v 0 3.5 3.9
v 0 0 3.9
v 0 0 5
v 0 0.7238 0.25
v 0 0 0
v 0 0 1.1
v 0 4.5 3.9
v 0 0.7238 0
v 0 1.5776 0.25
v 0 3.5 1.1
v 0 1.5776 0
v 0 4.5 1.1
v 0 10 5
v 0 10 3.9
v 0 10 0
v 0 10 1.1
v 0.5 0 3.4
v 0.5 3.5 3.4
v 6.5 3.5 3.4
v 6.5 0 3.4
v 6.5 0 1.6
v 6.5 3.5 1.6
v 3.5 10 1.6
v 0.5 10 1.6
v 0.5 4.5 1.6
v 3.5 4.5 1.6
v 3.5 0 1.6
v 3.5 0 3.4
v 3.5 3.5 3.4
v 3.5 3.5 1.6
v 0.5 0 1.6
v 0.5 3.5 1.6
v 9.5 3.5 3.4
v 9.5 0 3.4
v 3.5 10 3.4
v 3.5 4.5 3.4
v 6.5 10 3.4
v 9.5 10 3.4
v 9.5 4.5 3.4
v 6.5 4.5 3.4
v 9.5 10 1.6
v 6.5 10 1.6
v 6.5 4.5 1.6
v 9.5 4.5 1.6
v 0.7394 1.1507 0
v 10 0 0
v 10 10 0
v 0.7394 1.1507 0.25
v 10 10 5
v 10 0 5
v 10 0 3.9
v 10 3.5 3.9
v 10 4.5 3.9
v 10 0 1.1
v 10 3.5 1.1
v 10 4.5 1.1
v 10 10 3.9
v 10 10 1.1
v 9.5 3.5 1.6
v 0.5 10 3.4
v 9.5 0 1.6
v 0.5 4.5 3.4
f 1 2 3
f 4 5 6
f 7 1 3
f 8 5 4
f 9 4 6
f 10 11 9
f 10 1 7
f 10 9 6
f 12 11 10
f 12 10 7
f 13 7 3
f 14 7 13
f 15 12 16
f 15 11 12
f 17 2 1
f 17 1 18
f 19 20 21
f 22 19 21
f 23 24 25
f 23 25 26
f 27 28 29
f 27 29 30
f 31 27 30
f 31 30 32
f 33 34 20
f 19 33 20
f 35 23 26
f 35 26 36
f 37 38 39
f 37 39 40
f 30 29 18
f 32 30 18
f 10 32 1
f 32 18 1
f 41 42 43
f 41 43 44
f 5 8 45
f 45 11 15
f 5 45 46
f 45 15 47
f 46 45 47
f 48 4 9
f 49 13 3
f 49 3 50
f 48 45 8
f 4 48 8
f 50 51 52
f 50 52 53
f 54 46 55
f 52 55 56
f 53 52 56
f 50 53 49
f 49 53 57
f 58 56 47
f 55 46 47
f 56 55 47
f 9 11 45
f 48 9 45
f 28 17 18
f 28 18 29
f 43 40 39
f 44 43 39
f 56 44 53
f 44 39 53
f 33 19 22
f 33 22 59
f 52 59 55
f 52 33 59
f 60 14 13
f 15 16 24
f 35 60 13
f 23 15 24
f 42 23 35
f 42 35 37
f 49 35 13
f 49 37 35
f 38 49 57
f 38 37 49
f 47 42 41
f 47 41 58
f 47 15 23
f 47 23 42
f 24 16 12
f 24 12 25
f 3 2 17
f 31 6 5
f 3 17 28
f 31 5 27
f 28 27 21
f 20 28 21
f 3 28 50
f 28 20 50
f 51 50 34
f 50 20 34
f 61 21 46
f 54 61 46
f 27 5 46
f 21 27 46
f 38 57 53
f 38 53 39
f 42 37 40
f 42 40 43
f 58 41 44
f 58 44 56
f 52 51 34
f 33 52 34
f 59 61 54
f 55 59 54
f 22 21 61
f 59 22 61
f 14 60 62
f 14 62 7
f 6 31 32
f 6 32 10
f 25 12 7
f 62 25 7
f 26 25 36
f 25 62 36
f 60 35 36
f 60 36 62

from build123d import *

# Parameters (mm, degrees)
SKETCH_W        = 10
SKETCH_H        = 10
PAD_DEPTH       = 5
POCKET_DEPTH    = 3.5
POCKET001_DEPTH = 5.5
POCKET002_DEPTH = 0.25


with BuildPart() as part:
    # Sketch → Pad (new body)
    with BuildSketch(Plane.XY):
        with Locations((5, 5)):
            Rectangle(SKETCH_W, SKETCH_H)
    extrude(amount=PAD_DEPTH)

    # Sketch001 (on Face1 of Pad) → Pocket (cut)
    with BuildSketch(Plane.XZ):
        Polygon((0, 3.9), (0.5, 3.4), (3.5, 3.4), (3.5, 1.6), (0.5, 1.6), (0, 1.1), (-0.843027, 1.1), (-0.843027, 3.9), align=None)
        Polygon((10.955688, 3.9), (10, 3.9), (9.5, 3.4), (6.5, 3.4), (6.5, 1.6), (9.5, 1.6), (10, 1.1), (10.955688, 1.1), align=None)
    extrude(amount=-POCKET_DEPTH, mode=Mode.SUBTRACT)

    # Sketch002 (on Face16 of Pocket) → Pocket001 (cut)
    with BuildSketch(Plane(origin=(0, 10, 0), x_dir=(-1, 0, 0), z_dir=(0, 1, 0))):
        Polygon((-11.13075, 3.9), (-10, 3.9), (-9.5, 3.4), (-6.5, 3.4), (-6.5, 1.6), (-9.5, 1.6), (-10, 1.1), (-11.181449, 1.1), (-11.181449, 3.860271), align=None)
        Polygon((-3.5, 3.4), (-0.5, 3.4), (0, 3.9), (0.82411, 3.9), (0.98968, 1.1), (0, 1.1), (-0.5, 1.6), (-3.5, 1.6), align=None)
    extrude(amount=-POCKET001_DEPTH, mode=Mode.SUBTRACT)

    # Sketch003 (on Face2 of Pocket001) → Pocket002 (cut)
    with BuildSketch(Plane(origin=(0, 0, 0), x_dir=(1, 0, 0), z_dir=(0, 0, -1))):
        Polygon((-0.717832, -0.309342), (-0.717832, -1.992022), (0.739412, -1.150682), align=None)
    extrude(amount=-POCKET002_DEPTH, mode=Mode.SUBTRACT)


solid = part.part
